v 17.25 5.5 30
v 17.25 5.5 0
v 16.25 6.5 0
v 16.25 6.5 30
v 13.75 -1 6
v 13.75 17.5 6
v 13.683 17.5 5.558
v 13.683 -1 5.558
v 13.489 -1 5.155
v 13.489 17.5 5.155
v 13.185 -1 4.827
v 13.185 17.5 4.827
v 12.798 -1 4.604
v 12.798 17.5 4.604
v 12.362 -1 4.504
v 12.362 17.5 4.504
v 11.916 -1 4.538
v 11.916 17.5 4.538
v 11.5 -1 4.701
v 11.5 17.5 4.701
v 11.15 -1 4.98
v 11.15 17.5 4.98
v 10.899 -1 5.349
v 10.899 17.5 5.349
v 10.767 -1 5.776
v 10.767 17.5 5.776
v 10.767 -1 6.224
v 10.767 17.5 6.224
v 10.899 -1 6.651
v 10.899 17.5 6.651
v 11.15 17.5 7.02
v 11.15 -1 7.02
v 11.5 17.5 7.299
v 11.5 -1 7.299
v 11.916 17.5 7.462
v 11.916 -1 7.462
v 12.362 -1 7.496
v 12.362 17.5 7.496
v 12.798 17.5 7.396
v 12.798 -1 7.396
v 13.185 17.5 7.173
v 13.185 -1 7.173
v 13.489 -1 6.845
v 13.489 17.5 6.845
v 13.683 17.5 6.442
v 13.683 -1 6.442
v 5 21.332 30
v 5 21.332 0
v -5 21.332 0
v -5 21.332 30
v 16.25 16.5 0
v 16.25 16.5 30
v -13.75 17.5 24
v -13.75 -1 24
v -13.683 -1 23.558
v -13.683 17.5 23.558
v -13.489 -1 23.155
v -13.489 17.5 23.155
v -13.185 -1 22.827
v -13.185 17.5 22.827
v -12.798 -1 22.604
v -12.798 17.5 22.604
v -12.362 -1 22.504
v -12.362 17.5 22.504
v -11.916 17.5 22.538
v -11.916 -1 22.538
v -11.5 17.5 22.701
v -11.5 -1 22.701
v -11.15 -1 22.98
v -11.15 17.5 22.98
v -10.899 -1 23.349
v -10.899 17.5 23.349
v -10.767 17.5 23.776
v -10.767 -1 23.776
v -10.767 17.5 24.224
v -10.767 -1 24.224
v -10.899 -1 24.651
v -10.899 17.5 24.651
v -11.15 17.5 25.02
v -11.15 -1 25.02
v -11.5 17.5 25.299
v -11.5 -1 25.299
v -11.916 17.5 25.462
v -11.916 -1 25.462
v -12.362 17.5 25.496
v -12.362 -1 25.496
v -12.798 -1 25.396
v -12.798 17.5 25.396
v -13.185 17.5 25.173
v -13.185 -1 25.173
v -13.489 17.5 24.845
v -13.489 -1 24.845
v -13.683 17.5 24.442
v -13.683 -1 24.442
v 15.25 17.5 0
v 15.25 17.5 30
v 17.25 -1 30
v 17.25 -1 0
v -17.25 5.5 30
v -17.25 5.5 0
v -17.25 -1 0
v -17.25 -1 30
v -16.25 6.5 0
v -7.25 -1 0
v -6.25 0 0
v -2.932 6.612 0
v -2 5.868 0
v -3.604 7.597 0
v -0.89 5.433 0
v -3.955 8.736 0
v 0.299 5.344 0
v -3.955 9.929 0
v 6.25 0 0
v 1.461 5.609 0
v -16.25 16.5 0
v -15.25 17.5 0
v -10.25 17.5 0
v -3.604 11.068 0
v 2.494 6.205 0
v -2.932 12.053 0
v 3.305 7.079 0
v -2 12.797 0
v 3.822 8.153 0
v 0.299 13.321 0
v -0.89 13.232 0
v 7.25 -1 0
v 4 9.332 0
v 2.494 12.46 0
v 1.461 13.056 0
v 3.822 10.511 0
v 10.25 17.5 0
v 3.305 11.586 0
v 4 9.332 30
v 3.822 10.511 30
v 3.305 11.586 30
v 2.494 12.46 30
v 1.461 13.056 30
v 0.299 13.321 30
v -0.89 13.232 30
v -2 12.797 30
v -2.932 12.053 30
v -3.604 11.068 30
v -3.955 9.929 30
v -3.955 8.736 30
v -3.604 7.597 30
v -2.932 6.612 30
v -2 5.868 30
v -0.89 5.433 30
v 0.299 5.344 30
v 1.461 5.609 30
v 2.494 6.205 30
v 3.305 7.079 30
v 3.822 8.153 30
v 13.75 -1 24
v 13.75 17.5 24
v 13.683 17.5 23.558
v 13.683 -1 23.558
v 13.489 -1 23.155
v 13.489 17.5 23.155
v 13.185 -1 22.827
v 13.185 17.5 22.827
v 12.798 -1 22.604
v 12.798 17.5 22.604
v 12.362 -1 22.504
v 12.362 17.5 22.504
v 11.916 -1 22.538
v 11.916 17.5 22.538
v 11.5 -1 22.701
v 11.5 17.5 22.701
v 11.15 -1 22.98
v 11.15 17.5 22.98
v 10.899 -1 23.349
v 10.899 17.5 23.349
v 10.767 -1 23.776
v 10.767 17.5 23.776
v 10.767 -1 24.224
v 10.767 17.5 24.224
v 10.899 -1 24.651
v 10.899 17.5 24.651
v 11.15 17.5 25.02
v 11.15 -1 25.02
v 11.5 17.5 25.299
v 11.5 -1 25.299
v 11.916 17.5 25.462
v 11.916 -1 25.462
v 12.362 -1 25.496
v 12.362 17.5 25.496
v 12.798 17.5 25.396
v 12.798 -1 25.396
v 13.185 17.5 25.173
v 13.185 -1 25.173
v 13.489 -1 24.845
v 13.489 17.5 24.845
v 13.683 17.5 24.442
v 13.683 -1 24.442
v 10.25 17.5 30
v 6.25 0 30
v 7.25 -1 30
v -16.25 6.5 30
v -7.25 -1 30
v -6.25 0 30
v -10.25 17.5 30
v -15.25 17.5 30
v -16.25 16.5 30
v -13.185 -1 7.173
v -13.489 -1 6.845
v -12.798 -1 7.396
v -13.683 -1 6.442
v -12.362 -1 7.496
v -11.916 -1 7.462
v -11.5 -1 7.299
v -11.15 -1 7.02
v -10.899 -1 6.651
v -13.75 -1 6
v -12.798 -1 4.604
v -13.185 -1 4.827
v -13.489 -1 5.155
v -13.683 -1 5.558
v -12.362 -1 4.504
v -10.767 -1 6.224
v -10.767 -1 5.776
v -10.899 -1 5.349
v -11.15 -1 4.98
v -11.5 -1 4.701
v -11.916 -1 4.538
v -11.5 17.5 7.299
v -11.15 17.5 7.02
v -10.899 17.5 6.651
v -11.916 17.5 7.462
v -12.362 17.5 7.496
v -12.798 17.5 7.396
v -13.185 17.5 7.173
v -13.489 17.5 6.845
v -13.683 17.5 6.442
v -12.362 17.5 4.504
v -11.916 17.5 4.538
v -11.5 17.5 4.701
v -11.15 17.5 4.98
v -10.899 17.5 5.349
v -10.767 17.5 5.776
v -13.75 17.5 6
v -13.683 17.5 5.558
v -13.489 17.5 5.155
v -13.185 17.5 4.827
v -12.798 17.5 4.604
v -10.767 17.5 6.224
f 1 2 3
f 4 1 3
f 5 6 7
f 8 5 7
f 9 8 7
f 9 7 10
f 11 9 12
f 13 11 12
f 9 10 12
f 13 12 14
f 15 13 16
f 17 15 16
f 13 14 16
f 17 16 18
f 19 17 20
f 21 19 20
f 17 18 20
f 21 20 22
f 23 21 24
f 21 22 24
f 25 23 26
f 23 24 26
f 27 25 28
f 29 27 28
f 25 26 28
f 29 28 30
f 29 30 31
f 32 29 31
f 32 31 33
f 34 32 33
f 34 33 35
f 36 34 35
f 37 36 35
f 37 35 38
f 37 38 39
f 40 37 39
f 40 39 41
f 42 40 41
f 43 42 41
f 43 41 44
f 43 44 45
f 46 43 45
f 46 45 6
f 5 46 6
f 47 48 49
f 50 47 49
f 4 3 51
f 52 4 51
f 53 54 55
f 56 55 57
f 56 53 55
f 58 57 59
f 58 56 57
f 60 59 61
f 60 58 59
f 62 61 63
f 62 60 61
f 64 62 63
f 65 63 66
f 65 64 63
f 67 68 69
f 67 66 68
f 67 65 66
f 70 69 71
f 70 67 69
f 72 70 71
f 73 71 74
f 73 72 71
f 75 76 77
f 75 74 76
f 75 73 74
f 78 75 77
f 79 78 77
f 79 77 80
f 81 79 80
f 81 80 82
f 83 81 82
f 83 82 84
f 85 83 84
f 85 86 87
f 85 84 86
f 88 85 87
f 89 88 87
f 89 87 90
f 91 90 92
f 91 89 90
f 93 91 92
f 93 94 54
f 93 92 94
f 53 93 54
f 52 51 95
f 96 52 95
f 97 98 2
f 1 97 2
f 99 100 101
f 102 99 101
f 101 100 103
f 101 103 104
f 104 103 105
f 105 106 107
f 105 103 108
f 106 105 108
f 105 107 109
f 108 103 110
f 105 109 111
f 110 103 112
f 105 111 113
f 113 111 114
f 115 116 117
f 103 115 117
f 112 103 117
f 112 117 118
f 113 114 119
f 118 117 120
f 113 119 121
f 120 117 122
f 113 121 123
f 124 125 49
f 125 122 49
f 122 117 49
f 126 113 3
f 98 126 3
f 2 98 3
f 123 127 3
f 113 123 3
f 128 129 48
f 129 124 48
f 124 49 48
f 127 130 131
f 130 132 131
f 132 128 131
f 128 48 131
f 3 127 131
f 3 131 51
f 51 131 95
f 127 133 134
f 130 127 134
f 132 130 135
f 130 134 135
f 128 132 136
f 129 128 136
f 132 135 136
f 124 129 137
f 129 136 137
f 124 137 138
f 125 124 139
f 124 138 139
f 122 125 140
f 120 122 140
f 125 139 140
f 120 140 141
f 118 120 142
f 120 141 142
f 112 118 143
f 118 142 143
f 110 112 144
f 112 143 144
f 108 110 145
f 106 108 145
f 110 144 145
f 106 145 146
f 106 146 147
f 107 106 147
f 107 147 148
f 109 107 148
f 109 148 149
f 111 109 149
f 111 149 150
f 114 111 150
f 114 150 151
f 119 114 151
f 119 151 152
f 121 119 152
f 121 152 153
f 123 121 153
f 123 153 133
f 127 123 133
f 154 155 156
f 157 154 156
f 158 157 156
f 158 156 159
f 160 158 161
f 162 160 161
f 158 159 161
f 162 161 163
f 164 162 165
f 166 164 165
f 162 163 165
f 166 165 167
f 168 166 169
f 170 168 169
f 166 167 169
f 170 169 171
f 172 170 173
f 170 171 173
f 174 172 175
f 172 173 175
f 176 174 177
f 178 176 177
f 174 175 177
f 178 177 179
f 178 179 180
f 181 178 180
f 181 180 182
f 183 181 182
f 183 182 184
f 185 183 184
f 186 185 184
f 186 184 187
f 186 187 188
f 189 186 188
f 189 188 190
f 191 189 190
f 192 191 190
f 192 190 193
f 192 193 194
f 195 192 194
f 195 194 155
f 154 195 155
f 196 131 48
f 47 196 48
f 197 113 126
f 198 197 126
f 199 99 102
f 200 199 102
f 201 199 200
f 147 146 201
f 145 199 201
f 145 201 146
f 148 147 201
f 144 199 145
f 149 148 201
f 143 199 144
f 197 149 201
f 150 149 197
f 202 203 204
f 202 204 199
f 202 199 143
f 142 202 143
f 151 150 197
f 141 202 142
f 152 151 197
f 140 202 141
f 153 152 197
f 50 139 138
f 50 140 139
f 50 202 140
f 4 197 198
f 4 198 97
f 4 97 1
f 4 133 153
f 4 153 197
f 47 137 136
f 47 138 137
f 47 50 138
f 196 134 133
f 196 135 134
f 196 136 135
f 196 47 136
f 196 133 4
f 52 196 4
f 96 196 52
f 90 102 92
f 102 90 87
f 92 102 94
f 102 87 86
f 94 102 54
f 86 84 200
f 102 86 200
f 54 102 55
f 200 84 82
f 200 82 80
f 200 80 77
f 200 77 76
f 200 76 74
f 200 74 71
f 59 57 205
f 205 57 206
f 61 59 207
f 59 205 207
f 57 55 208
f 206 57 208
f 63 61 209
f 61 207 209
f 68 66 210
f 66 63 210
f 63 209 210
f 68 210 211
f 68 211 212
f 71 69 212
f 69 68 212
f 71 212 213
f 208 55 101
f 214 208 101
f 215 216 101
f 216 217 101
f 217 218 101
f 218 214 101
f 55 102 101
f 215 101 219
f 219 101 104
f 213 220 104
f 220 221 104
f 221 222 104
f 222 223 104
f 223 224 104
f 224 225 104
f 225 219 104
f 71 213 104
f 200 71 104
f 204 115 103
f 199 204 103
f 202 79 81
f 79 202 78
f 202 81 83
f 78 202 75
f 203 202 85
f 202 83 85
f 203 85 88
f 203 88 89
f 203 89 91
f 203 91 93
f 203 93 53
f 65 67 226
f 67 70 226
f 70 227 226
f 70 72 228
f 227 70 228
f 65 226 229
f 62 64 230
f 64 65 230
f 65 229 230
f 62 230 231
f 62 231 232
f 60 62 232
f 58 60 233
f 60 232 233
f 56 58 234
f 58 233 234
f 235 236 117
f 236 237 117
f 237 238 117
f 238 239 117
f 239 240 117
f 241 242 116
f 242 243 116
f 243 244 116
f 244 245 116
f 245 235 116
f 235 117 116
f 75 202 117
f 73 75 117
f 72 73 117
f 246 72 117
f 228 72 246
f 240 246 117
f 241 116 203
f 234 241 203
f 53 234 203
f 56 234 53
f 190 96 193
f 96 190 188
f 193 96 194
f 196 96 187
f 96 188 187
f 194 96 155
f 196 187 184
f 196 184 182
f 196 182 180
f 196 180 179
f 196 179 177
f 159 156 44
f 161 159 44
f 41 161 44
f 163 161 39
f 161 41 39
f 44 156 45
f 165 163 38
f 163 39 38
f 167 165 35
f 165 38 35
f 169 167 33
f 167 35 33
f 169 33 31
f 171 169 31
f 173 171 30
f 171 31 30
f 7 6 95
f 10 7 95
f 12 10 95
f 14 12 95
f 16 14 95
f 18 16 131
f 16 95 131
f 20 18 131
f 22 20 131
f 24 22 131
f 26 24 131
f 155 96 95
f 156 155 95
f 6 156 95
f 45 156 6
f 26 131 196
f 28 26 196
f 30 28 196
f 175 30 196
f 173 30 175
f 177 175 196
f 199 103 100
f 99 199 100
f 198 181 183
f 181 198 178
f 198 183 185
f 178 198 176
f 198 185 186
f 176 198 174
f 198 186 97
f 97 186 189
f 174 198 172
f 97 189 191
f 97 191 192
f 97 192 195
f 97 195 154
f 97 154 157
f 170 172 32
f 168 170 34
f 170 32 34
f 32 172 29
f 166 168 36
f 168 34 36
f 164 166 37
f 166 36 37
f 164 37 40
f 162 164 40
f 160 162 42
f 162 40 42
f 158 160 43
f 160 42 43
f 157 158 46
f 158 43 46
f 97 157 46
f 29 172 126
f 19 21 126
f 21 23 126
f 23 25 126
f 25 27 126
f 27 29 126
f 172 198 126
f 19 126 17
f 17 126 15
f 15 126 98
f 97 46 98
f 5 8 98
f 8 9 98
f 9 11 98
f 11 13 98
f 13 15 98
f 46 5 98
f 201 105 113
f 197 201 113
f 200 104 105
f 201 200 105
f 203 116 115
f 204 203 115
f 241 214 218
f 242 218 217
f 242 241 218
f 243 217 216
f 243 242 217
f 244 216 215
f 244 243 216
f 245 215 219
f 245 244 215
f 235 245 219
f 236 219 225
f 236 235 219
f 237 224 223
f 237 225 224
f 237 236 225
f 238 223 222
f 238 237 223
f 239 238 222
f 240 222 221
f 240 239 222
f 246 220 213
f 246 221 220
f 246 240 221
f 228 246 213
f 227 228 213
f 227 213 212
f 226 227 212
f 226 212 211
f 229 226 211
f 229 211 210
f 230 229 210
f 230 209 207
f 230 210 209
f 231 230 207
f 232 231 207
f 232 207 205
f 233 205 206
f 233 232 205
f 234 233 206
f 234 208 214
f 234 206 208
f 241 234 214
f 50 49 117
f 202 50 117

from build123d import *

# Parameters (mm, degrees)
BOSS_EXTRUDE1_DEPTH = 30
SKETCH2_R           = 4
CUT_EXTRUDE1_DEPTH  = 31
SKETCH3_R           = 1.5
CUT_EXTRUDE2_DEPTH  = 19.5


with BuildPart() as part:
    # Sketch1 → Boss-Extrude1 (new body)
    with BuildSketch(Plane.XY):
        Polygon((0, 0), (6.25, 0), (7.25, -1), (17.25, -1), (17.25, 5.5), (16.25, 6.5), (16.25, 16.5), (15.25, 17.5), (10.25, 17.5), (5, 21.332427429), (-5, 21.332427429), (-10.25, 17.5), (-15.25, 17.5), (-16.25, 16.5), (-16.25, 6.5), (-17.25, 5.5), (-17.25, -1), (-7.25, -1), (-6.25, 0), align=None)
    extrude(amount=BOSS_EXTRUDE1_DEPTH)

    # Sketch2 → Cut-Extrude1 (cut, through all)
    with BuildSketch(Plane.XY.offset(30)):
        with Locations((0, 9.332427429)):
            Circle(SKETCH2_R)
    extrude(amount=-CUT_EXTRUDE1_DEPTH, mode=Mode.SUBTRACT)

    # Sketch3 → Cut-Extrude2 (cut, through all)
    with BuildSketch(Plane(origin=(0, 17.5, 0), x_dir=(1, 0, 0), z_dir=(0, 1, 0))):
        with Locations((12.25, -6)):
            Circle(SKETCH3_R)
        with Locations((12.25, -24)):
            Circle(SKETCH3_R)
    cut_extrude2 = extrude(amount=-CUT_EXTRUDE2_DEPTH, mode=Mode.SUBTRACT)

    # Mirror1: Cut-Extrude2 across plane
    add(cut_extrude2.mirror(Plane(origin=(0, 0, 0), x_dir=(0, 0, 1), z_dir=(1, 0, 0))), mode=Mode.SUBTRACT)


solid = part.part
